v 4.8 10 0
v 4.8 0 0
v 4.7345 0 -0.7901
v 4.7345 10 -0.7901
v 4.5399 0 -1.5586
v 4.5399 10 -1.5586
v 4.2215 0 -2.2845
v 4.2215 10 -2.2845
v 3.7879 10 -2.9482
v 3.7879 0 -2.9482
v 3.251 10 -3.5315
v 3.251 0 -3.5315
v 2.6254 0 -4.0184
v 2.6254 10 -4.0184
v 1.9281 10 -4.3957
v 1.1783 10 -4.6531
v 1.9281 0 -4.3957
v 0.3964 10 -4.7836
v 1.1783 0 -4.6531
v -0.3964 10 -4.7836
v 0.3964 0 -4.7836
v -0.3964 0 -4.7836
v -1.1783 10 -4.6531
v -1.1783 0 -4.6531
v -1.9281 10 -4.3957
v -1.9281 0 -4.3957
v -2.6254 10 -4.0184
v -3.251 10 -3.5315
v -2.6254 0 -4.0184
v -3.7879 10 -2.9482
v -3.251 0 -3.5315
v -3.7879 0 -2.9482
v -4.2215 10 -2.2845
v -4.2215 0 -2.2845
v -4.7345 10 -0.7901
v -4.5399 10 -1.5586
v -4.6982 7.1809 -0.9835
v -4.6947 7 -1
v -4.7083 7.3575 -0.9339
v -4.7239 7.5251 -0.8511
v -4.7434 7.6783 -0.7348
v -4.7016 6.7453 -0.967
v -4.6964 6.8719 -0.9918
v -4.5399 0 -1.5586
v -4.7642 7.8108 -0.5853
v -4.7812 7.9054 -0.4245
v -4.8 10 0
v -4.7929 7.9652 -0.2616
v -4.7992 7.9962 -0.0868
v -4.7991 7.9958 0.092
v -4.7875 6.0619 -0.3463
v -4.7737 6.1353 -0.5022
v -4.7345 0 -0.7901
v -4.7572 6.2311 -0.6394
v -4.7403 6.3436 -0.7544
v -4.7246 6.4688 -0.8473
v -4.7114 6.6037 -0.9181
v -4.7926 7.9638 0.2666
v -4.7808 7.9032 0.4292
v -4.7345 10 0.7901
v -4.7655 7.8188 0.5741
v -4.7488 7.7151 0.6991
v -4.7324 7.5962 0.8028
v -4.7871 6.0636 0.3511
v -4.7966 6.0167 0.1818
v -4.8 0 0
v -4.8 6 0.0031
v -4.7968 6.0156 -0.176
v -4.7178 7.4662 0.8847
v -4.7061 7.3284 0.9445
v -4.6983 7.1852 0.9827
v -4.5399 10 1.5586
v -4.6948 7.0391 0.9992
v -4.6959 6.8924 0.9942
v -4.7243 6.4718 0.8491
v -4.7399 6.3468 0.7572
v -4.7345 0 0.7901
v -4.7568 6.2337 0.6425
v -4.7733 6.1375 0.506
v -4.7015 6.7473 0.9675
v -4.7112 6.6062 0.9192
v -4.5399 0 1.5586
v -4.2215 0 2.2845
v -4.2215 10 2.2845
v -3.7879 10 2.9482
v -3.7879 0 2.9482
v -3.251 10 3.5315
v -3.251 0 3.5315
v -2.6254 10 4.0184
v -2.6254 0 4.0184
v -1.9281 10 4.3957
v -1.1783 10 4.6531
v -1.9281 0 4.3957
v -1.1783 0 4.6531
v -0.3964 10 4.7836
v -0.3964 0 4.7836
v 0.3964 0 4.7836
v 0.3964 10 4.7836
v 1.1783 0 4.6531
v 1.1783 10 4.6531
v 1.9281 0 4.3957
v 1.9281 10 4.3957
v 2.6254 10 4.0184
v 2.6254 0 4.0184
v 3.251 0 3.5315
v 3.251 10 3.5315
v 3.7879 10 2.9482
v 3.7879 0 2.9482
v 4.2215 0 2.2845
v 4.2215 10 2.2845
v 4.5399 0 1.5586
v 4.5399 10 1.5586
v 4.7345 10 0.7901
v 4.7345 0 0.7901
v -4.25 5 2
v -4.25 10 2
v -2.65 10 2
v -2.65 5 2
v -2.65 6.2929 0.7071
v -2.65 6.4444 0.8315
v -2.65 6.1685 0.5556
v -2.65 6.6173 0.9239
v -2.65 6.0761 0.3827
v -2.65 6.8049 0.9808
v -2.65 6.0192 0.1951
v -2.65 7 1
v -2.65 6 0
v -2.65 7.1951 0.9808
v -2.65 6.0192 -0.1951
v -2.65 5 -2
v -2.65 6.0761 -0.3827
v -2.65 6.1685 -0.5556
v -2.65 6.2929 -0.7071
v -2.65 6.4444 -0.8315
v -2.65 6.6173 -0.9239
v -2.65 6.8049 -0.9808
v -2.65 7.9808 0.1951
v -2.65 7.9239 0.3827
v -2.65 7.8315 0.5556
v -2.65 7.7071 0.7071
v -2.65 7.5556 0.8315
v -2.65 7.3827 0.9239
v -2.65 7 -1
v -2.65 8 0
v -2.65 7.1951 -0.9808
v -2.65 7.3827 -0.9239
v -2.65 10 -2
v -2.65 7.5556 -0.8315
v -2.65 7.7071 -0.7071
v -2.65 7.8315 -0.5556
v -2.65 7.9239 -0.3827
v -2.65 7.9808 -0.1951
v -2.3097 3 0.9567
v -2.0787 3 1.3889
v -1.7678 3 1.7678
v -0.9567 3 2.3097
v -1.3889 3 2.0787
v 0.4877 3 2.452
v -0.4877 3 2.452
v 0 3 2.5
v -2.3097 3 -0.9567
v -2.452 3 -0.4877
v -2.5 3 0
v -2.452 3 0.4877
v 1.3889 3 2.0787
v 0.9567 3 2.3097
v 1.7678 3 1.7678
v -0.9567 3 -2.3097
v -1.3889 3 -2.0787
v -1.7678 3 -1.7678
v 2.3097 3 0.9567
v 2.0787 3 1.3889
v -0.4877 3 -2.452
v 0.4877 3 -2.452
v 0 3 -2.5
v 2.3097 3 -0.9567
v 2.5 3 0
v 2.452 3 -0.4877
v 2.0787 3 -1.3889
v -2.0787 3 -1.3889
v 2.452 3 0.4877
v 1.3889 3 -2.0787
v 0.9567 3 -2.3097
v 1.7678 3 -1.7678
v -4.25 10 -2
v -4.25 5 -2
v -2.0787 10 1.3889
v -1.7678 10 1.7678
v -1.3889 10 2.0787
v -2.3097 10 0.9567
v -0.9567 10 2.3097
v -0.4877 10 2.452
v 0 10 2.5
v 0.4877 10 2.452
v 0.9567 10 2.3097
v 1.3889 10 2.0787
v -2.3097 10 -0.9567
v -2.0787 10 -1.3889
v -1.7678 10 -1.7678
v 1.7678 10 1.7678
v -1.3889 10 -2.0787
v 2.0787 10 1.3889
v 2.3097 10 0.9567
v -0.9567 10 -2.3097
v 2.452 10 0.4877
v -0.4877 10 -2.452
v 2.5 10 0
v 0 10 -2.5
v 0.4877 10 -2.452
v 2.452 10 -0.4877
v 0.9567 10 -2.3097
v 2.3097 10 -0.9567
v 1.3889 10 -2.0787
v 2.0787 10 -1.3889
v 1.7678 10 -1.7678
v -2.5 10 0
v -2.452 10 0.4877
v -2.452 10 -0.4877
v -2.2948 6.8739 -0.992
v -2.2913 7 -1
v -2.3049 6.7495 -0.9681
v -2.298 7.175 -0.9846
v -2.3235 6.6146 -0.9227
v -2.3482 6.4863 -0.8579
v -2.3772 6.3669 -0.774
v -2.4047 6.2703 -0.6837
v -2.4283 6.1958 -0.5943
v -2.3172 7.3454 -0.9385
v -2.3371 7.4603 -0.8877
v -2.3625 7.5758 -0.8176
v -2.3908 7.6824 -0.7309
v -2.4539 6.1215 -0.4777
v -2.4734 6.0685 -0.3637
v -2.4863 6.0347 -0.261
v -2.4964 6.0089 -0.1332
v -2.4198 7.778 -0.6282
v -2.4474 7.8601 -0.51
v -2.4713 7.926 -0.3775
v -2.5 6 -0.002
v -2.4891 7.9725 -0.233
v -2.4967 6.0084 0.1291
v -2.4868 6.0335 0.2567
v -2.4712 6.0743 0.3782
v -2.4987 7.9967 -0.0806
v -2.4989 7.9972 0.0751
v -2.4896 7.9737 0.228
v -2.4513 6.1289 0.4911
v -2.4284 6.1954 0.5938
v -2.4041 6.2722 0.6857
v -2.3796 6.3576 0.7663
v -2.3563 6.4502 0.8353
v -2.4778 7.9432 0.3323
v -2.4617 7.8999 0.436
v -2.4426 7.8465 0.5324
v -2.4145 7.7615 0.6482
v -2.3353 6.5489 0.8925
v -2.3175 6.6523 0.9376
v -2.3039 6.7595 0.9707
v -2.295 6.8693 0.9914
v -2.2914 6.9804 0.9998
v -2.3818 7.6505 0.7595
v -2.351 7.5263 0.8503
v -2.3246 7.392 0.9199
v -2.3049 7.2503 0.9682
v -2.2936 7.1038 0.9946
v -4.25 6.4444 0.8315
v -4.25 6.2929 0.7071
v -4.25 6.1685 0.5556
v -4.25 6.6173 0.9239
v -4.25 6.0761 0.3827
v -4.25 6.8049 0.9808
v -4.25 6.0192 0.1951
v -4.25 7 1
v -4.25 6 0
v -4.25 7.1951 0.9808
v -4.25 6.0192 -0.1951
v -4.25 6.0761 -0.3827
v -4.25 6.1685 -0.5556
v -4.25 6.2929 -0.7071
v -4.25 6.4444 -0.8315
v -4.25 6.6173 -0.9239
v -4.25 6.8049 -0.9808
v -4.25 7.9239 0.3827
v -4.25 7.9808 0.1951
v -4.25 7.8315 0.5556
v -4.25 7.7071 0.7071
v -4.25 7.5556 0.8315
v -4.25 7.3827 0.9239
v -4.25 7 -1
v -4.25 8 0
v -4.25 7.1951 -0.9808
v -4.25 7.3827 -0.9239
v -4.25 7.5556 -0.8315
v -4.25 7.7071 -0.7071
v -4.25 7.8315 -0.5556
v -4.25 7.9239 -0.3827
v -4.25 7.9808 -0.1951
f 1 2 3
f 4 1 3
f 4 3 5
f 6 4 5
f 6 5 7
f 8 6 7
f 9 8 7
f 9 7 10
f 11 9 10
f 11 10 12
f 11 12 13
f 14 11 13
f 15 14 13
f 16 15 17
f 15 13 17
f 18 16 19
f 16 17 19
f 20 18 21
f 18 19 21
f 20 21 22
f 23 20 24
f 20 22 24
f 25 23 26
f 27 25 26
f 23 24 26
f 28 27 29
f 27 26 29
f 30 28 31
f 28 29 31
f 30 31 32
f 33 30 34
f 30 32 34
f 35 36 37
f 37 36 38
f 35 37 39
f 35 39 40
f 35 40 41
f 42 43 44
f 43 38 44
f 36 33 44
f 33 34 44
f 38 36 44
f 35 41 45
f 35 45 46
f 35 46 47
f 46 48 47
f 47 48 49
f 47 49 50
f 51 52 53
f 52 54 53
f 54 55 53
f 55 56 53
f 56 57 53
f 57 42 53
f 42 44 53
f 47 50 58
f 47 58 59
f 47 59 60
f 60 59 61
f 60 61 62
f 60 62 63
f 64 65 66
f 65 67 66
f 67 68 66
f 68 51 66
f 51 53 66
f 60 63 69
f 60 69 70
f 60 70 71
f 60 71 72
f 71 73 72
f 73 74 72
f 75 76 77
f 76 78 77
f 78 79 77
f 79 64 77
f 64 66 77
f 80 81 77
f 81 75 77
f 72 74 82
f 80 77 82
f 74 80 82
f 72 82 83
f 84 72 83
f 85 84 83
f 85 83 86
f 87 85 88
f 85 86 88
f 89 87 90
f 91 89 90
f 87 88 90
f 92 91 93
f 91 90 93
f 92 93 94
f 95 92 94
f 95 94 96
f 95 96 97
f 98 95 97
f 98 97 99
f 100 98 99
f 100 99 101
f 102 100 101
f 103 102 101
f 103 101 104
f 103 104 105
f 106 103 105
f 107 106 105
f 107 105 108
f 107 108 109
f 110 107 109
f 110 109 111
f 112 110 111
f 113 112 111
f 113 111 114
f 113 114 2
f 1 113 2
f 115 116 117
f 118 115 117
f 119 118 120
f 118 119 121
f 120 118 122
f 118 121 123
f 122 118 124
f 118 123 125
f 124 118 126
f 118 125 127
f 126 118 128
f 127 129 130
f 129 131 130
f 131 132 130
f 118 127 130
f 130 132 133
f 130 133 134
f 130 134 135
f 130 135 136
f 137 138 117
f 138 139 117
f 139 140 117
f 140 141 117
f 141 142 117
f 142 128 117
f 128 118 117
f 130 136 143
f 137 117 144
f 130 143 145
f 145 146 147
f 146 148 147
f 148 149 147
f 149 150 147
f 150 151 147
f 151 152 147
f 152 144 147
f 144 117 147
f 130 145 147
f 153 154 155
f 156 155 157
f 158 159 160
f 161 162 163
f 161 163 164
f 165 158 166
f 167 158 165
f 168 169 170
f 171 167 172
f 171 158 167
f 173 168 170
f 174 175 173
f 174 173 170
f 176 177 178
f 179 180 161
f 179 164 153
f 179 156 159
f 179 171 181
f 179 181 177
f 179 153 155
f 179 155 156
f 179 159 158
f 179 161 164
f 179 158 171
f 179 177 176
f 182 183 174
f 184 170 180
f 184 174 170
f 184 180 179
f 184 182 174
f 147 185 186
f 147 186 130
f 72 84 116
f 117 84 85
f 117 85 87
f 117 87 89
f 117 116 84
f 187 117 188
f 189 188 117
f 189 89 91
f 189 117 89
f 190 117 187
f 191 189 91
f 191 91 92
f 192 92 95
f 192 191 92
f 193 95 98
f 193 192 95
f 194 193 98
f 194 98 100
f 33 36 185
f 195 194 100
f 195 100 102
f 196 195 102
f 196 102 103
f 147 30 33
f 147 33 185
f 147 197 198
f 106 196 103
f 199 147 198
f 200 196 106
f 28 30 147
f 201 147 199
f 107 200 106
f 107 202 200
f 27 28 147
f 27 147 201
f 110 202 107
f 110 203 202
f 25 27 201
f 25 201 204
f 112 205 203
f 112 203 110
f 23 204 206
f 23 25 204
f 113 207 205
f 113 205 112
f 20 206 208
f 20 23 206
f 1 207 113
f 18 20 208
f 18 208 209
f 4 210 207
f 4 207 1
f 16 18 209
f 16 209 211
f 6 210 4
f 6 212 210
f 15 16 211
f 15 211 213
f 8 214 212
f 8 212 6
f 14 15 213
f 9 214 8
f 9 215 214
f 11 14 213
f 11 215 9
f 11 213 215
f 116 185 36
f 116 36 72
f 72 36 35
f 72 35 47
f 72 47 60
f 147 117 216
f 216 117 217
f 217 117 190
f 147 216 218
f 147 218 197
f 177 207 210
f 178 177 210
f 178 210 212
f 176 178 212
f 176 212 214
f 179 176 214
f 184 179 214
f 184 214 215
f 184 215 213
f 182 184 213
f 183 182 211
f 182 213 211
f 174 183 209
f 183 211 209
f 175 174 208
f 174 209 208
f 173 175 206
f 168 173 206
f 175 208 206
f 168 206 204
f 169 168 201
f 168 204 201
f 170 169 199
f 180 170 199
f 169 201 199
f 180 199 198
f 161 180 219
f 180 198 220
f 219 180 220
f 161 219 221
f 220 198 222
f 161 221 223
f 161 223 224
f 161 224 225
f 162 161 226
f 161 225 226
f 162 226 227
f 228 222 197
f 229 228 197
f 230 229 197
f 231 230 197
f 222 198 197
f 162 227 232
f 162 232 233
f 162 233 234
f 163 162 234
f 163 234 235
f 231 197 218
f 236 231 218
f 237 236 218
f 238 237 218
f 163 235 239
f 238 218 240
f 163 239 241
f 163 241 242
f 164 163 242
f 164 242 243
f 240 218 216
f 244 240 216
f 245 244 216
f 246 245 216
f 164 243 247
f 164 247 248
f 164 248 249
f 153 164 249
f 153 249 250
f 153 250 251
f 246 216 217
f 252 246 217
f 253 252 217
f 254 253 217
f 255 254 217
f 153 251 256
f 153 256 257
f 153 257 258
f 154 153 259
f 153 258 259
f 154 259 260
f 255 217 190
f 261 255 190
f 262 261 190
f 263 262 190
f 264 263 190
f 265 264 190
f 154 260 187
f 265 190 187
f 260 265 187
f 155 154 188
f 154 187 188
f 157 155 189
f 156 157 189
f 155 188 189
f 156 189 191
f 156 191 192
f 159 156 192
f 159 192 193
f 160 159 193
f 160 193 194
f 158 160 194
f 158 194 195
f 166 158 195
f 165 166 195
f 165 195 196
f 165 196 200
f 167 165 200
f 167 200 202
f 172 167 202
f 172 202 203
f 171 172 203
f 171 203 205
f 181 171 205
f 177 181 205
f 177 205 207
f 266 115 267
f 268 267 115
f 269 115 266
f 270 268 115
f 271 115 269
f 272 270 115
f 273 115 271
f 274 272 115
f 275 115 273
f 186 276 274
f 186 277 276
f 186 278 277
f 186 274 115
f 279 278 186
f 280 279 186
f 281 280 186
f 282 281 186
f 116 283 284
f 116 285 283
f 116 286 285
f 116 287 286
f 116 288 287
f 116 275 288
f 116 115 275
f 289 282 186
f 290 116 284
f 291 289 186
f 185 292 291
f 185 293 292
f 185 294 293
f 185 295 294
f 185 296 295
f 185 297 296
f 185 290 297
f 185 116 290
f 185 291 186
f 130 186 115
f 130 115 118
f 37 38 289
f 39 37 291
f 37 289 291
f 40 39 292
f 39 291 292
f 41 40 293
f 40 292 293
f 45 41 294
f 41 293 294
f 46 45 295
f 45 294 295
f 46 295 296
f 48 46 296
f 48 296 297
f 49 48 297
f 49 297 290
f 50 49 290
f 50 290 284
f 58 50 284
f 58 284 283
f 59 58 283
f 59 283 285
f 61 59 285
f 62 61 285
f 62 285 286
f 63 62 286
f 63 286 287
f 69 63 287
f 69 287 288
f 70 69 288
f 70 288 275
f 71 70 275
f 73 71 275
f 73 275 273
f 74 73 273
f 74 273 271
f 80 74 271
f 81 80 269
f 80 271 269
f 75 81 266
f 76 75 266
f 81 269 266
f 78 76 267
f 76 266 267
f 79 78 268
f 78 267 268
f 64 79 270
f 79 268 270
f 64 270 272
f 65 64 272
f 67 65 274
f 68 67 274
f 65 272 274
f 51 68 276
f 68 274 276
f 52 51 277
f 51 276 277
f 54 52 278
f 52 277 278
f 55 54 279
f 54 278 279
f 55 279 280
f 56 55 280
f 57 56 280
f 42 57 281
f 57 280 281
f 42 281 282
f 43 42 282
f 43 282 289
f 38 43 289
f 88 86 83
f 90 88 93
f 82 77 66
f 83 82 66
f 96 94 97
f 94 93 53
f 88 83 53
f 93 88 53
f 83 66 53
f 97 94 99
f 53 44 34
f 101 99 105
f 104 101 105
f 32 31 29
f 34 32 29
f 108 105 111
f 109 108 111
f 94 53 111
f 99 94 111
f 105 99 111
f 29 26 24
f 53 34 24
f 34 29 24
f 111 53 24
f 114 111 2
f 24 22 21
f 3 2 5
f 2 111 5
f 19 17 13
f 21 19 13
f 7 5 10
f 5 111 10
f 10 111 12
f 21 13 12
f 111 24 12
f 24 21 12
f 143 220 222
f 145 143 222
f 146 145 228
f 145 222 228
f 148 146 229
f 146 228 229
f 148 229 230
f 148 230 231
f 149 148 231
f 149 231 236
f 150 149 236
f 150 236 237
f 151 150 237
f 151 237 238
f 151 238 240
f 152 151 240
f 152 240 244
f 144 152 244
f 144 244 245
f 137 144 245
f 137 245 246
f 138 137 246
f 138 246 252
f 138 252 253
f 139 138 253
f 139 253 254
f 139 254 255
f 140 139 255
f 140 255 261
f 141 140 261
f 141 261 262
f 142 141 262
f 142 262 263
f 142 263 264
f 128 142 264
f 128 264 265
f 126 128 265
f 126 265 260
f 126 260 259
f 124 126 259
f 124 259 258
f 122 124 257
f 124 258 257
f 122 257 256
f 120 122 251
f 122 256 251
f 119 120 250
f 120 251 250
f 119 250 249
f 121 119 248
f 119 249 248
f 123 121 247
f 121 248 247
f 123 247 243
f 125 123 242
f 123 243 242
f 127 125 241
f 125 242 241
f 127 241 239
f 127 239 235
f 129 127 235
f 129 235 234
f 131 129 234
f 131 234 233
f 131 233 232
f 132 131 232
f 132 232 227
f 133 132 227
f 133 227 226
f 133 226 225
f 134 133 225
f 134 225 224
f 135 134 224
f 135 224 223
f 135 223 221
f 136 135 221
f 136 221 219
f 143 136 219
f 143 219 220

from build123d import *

# Parameters (mm, degrees)
IZIM1_R                     = 4.8
Y_KSEKLIK_EKSTR_ZYON1_DEPTH = 10
IZIM2_R                     = 2.5
KES_EKSTR_ZYON1_DEPTH       = 7
IZIM3_R                     = 1
KES_EKSTR_ZYON2_DEPTH       = 5.8
IZIM4_W                     = 1.6
IZIM4_H                     = 4
KES_EKSTR_ZYON3_DEPTH       = 5


with BuildPart() as part:
    # Çizim1 → Yükseklik-Ekstrüzyon1 (new body)
    with BuildSketch(Plane(origin=(0, 0, 0), x_dir=(1, 0, 0), z_dir=(0, 1, 0))):
        Circle(IZIM1_R)
    extrude(amount=Y_KSEKLIK_EKSTR_ZYON1_DEPTH)

    # Çizim2 → Kes-Ekstrüzyon1 (cut)
    with BuildSketch(Plane(origin=(0, 10, 0), x_dir=(1, 0, 0), z_dir=(0, 1, 0))):
        Circle(IZIM2_R)
    extrude(amount=-KES_EKSTR_ZYON1_DEPTH, mode=Mode.SUBTRACT)

    # Çizim3 → Kes-Ekstrüzyon2 (cut, through all)
    with BuildSketch(Plane(origin=(0, 0, 0), x_dir=(0, 0, -1), z_dir=(1, 0, 0))):
        with Locations((0, 7)):
            Circle(IZIM3_R)
    extrude(amount=-KES_EKSTR_ZYON2_DEPTH, mode=Mode.SUBTRACT)

    # Çizim4 → Kes-Ekstrüzyon3 (cut)
    with BuildSketch(Plane(origin=(0, 10, 0), x_dir=(1, 0, 0), z_dir=(0, 1, 0))):
        with Locations((-3.45, 0)):
            Rectangle(IZIM4_W, IZIM4_H)
    extrude(amount=-KES_EKSTR_ZYON3_DEPTH, mode=Mode.SUBTRACT)


solid = part.part
